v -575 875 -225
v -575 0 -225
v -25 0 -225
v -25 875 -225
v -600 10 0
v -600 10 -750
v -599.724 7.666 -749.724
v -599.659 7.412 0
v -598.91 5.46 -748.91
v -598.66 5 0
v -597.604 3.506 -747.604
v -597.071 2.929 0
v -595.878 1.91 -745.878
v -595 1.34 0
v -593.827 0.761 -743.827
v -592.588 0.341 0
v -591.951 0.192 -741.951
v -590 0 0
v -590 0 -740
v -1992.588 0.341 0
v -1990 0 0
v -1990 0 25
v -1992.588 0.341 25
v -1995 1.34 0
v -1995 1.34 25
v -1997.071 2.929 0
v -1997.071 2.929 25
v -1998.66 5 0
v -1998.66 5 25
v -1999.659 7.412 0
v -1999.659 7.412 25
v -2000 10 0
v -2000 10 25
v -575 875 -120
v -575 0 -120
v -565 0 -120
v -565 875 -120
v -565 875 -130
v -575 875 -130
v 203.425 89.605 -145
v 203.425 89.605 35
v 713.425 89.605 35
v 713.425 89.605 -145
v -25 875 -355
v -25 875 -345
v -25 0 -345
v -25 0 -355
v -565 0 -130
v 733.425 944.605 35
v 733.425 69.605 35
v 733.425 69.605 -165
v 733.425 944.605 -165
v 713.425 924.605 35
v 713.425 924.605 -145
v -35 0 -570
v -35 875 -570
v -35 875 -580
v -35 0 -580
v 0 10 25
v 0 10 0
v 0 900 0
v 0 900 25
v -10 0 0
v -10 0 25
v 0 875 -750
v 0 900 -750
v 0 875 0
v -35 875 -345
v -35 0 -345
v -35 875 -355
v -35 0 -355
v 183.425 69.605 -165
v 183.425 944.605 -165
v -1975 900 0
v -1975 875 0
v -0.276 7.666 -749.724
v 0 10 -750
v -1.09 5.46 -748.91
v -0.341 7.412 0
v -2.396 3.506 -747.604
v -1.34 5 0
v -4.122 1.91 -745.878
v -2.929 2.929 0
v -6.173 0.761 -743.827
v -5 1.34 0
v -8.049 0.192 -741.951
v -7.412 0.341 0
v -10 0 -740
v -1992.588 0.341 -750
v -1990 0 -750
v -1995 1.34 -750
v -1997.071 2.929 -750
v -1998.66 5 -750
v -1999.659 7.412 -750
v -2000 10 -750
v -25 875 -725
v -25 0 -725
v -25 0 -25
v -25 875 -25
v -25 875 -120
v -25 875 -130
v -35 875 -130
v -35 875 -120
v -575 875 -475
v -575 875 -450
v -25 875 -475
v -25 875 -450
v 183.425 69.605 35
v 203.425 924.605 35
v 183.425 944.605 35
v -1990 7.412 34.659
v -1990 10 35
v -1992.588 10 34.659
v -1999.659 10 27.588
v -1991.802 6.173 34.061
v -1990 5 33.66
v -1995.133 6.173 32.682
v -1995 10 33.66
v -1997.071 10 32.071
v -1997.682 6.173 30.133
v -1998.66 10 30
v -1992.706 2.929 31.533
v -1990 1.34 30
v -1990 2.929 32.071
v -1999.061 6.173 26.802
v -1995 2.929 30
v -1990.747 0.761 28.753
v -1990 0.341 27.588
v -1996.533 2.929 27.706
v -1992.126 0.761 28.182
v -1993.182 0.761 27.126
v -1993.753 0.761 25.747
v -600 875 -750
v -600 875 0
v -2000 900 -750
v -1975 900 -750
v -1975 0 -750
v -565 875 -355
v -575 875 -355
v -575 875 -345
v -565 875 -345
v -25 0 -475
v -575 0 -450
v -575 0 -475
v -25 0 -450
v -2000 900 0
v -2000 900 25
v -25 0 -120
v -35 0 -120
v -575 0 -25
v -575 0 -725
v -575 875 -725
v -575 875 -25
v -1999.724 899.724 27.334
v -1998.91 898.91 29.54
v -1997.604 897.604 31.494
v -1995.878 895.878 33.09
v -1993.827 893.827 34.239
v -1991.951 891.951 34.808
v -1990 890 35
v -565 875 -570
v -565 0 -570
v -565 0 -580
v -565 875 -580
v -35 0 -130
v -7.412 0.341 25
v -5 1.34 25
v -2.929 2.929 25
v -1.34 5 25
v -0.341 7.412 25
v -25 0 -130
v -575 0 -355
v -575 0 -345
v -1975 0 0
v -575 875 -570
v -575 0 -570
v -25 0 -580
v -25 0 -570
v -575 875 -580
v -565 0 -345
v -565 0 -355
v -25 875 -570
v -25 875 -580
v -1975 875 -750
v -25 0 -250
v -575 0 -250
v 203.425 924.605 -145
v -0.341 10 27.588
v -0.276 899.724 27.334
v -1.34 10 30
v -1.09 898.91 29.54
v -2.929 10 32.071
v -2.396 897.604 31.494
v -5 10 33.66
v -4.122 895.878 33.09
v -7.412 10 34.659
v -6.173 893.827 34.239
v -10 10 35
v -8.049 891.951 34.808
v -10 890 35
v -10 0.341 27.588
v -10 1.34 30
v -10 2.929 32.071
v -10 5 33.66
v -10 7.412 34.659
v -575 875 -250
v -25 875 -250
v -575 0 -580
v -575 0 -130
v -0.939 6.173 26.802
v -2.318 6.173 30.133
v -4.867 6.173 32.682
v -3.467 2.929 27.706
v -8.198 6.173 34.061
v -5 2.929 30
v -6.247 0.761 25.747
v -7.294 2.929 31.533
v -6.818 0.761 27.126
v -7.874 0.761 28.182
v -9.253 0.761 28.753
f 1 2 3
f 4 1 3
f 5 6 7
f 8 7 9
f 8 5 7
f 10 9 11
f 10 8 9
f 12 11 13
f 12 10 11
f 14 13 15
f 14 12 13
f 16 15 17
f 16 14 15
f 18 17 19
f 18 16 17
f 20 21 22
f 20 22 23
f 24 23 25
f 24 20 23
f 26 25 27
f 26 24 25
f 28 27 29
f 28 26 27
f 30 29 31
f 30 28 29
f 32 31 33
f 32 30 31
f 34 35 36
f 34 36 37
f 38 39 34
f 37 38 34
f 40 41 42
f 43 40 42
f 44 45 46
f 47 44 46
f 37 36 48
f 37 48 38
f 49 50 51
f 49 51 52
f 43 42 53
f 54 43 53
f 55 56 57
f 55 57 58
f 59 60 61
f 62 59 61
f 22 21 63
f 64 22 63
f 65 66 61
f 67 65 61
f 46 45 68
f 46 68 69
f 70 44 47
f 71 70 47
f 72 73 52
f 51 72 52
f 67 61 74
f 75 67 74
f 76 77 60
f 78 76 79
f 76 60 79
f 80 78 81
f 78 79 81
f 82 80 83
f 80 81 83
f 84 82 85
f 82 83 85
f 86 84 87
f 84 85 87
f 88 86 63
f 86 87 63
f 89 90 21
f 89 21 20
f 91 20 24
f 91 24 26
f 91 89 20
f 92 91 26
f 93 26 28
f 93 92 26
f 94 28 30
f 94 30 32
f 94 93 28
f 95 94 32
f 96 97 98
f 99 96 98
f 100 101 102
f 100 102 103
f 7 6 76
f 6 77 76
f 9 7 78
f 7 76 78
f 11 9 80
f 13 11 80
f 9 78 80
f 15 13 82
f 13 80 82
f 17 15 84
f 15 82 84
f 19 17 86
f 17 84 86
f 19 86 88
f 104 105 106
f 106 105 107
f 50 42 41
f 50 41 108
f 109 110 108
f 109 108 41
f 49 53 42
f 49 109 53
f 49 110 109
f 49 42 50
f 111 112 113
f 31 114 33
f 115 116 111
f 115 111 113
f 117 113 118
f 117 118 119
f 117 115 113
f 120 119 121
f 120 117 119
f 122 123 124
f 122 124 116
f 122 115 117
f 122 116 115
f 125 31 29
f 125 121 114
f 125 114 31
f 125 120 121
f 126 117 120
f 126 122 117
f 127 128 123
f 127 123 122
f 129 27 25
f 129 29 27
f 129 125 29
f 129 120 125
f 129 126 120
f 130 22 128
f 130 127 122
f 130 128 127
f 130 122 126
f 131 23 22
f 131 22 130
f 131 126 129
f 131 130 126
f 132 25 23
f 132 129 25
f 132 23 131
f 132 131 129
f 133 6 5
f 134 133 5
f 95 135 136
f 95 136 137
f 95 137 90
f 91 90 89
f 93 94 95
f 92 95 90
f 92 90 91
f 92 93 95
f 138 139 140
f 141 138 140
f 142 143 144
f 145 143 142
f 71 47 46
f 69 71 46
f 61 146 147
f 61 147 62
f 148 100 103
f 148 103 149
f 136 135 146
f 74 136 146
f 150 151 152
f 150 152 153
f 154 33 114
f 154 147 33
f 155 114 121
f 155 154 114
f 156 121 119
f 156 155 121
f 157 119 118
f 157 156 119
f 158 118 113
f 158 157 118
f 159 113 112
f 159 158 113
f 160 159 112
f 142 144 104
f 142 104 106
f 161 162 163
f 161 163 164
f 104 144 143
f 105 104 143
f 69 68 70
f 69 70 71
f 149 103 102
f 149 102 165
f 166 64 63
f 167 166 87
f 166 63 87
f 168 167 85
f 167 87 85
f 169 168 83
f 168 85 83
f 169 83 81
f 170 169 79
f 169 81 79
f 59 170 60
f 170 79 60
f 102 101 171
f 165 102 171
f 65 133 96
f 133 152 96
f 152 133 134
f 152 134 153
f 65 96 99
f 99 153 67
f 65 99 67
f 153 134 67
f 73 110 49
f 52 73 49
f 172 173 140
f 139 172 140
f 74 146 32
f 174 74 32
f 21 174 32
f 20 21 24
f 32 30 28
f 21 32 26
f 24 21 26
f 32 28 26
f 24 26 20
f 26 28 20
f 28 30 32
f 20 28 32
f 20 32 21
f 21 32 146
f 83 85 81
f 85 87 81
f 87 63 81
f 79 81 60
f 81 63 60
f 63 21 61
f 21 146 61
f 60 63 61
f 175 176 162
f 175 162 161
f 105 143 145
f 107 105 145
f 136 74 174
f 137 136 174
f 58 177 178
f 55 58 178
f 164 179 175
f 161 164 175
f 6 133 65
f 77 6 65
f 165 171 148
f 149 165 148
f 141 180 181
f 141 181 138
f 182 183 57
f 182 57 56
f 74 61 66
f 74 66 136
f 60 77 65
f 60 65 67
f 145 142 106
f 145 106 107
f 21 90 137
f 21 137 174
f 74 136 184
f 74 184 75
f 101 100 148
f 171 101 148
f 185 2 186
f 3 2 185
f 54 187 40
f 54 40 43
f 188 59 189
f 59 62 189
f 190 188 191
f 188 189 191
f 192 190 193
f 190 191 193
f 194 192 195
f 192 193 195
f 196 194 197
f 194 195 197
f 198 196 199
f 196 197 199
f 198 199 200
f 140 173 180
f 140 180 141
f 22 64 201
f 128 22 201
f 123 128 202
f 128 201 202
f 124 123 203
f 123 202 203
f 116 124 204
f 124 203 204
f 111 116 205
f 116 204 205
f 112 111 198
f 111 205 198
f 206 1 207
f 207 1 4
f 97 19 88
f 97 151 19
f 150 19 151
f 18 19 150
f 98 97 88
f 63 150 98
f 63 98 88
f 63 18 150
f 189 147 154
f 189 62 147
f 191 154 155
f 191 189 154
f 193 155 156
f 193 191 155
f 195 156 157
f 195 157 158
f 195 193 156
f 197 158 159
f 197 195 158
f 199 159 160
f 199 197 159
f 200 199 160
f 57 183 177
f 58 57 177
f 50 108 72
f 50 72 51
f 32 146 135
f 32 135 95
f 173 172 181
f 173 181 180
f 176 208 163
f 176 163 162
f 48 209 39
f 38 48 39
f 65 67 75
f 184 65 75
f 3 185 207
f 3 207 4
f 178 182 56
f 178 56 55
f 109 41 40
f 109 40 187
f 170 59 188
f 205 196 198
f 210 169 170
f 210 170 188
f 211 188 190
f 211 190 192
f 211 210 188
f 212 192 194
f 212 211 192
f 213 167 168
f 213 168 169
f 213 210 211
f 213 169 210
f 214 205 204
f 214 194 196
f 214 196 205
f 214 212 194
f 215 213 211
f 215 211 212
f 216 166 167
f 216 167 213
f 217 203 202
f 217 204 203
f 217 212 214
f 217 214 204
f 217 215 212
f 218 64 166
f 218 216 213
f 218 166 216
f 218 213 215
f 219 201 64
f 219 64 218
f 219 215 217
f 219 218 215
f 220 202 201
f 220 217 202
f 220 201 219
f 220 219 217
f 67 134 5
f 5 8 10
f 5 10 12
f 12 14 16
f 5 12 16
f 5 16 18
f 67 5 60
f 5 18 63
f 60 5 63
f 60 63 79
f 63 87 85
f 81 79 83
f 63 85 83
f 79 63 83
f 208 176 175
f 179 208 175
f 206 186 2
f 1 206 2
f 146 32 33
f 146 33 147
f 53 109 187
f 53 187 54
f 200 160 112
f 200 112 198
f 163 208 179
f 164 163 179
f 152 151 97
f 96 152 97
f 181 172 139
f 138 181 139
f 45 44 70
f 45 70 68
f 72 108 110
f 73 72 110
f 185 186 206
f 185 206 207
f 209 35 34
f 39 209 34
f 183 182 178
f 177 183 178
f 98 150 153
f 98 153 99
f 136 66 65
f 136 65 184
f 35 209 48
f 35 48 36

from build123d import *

# Parameters (mm, degrees)
F0_W           = 2000
F0_H           = 900
F1_DEPTH       = 35
F2_R           = 10
F3_W           = 600
F3_H           = 750
F3_W_2         = 550
F3_H_2         = 700
F4_DEPTH       = 875
F5_R           = 10
F6_W           = 900
F6_H           = 750
F7_DEPTH       = 25
F8_W           = 1975
F8_H           = 750
F9_DEPTH       = 25
F10_T1_DEPTH   = 50
F10_S5_W       = 10
F10_S5_H       = 10
F10_T6_DEPTH   = 10
F10_2_T1_DEPTH = 800
F11_T1_DEPTH   = 50
F11_S5_W       = 10
F11_S5_H       = 10
F11_T6_DEPTH   = 10
F12_W          = 550
F12_H          = 25
F13_DEPTH      = 875
F14_W          = 550
F14_H          = 25
F15_DEPTH      = 875
F16_W          = 875
F16_H          = 10
F17_DEPTH      = 10
F18_W          = 875
F18_H          = 10
F19_DEPTH      = 10
F20_W          = 550
F20_H          = 875
F21_DEPTH      = 200
F22_T          = -20


# Not quite as in the source:
# - a fillet or chamfer that OpenCascade refuses, or shapes differently, is made with other operations: its cross-section is extruded or revolved along the edge and cut away or added


with BuildPart() as f1:
    # F0 (on Top) → F1 (new body)
    with BuildSketch(Plane.XY):
        with Locations((-1000, 450)):
            Rectangle(F0_W, F0_H)
    extrude(amount=F1_DEPTH)

    # F2
    f2_edges = [f1.edges().sort_by_distance(p)[0] for p in [
        (-2000, 450, 35),
        (-1000, 900, 35),
        (0, 450, 35),
        (-1000, 0, 35),
    ]]
    fillet(f2_edges, radius=F2_R)

    # F10: fillet of radius 10 on 1 edges, made by hand

    # F10_s2 → F10_t1 (cut)
    with BuildSketch(Plane.XY.offset(-25)):
        with BuildLine():
            ThreePointArc((-1990, 0), (-1997.0710678119, 2.9289321881), (-2000, 10))
            Line((-2000, 10), (-2000, 0))
            Line((-2000, 0), (-1990, 0))
        make_face()
    extrude(amount=F10_T1_DEPTH, mode=Mode.SUBTRACT)


with BuildPart() as f4:
    # F3 (on Front) → F4 (new body)
    with BuildSketch(Plane.XZ):
        with Locations((-300, -375)):
            Rectangle(F3_W, F3_H)
        with Locations((-300, -375)):
            Rectangle(F3_W_2, F3_H_2, mode=Mode.SUBTRACT)
    extrude(amount=-F4_DEPTH)

    # F5
    f5_edges = [f4.edges().sort_by_distance(p)[0] for p in [
        (-600, 0, -375),
        (-300, 0, -750),
        (0, 0, -375),
    ]]
    fillet(f5_edges, radius=F5_R)


with BuildPart() as f7:
    # F6 (on face) → F7 (new body)
    with BuildSketch(Plane(origin=(-2000, 0, 0), x_dir=(0, -1, 0), z_dir=(-1, 0, 0))):
        with Locations((-450, -375)):
            Rectangle(F6_W, F6_H)
    extrude(amount=-F7_DEPTH)

    # F10#2: fillet of radius 10 on 1 edges, made by hand

    # F10_2_s2 → F10_2_t1 (cut)
    with BuildSketch(Plane.XY.offset(-775)):
        with BuildLine():
            ThreePointArc((-1990, 0), (-1997.0710678119, 2.9289321881), (-2000, 10))
            Line((-2000, 10), (-2000, 0))
            Line((-2000, 0), (-1990, 0))
        make_face()
    extrude(amount=F10_2_T1_DEPTH, mode=Mode.SUBTRACT)


with BuildPart() as f9:
    # F8 (on face) → F9 (new body)
    with BuildSketch(Plane(origin=(0, 900, 0), x_dir=(-1, 0, 0), z_dir=(0, 1, 0))):
        with Locations((987.5, -375)):
            Rectangle(F8_W, F8_H)
    extrude(amount=-F9_DEPTH)


with BuildPart() as f10_tool4:
    # F10_s5 → F10_t6 (new body)
    with BuildSketch(Plane.XZ.offset(-10)):
        with Locations((-1995, 30)):
            Rectangle(F10_S5_W, F10_S5_H)
    extrude(amount=F10_T6_DEPTH)

    # F10_s7 → F10_t8 (revolve, cut)
    with BuildSketch(Plane(origin=(-1990, 10, 25), x_dir=(0.7071067812, 0, -0.7071067812), z_dir=(-0.7071067812, 0, -0.7071067812))):
        with BuildLine():
            ThreePointArc((0, -10), (10, 0), (0, 10))
            Line((0, 10), (0, -10))
        make_face()
    revolve(axis=Axis((-1990, 10, 25), (0, -1, 0)), mode=Mode.SUBTRACT)


with BuildPart() as f1_1:
    add(f1.part)

    # F10_t3: cut F10_tool4
    add(f10_tool4.part, mode=Mode.SUBTRACT)

    # F11: fillet of radius 10 on 1 edges, made by hand

    # F11_s2 → F11_t1 (cut)
    with BuildSketch(Plane.XY.offset(-25)):
        with BuildLine():
            ThreePointArc((-10, 0), (-2.9289321881, 2.9289321881), (0, 10))
            Line((0, 10), (0, 0))
            Line((0, 0), (-10, 0))
        make_face()
    extrude(amount=F11_T1_DEPTH, mode=Mode.SUBTRACT)


with BuildPart() as f11_tool4:
    # F11_s5 → F11_t6 (new body)
    with BuildSketch(Plane.XZ.offset(-10)):
        with Locations((-5, 30)):
            Rectangle(F11_S5_W, F11_S5_H)
    extrude(amount=F11_T6_DEPTH)

    # F11_s7 → F11_t8 (revolve, cut)
    with BuildSketch(Plane(origin=(-10, 10, 25), x_dir=(-0.7071067812, 0, -0.7071067812), z_dir=(-0.7071067812, 0, 0.7071067812))):
        with BuildLine():
            ThreePointArc((0, -10), (10, 0), (0, 10))
            Line((0, 10), (0, -10))
        make_face()
    revolve(axis=Axis((-10, 10, 25), (0, -1, 0)), mode=Mode.SUBTRACT)


with BuildPart() as f1_2:
    add(f1_1.part)

    # F11_t3: cut F11_tool4
    add(f11_tool4.part, mode=Mode.SUBTRACT)


with BuildPart() as f13:
    # F12 (on face) → F13 (new body)
    with BuildSketch(Plane.XZ):
        with Locations((-300, -237.5)):
            Rectangle(F12_W, F12_H)
    extrude(amount=-F13_DEPTH)


with BuildPart() as f15:
    # F14 (on face) → F15 (new body)
    with BuildSketch(Plane.XZ):
        with Locations((-300, -462.5)):
            Rectangle(F14_W, F14_H)
    extrude(amount=-F15_DEPTH)


with BuildPart() as f17:
    # F16 (on face) → F17 (new body)
    with BuildSketch(Plane.YZ.offset(-575)):
        with Locations((437.5, -125)):
            Rectangle(F16_W, F16_H)
    extrude(amount=F17_DEPTH)


with BuildPart() as f17b:
    # F16 (on face) → F17, piece 2 (new body)
    with BuildSketch(Plane.YZ.offset(-575)):
        with Locations((437.5, -350)):
            Rectangle(F16_W, F16_H)
    extrude(amount=F17_DEPTH)


with BuildPart() as f17c:
    # F16 (on face) → F17, piece 3 (new body)
    with BuildSketch(Plane.YZ.offset(-575)):
        with Locations((437.5, -575)):
            Rectangle(F16_W, F16_H)
    extrude(amount=F17_DEPTH)


with BuildPart() as f19:
    # F18 (on face) → F19 (new body)
    with BuildSketch(Plane(origin=(-25, 0, 0), x_dir=(0, -1, 0), z_dir=(-1, 0, 0))):
        with Locations((-437.5, -125)):
            Rectangle(F18_W, F18_H)
    extrude(amount=F19_DEPTH)


with BuildPart() as f19b:
    # F18 (on face) → F19, piece 2 (new body)
    with BuildSketch(Plane(origin=(-25, 0, 0), x_dir=(0, -1, 0), z_dir=(-1, 0, 0))):
        with Locations((-437.5, -350)):
            Rectangle(F18_W, F18_H)
    extrude(amount=F19_DEPTH)


with BuildPart() as f19c:
    # F18 (on face) → F19, piece 3 (new body)
    with BuildSketch(Plane(origin=(-25, 0, 0), x_dir=(0, -1, 0), z_dir=(-1, 0, 0))):
        with Locations((-437.5, -575)):
            Rectangle(F18_W, F18_H)
    extrude(amount=F19_DEPTH)


with BuildPart() as f21:
    # F20 (on face) → F21 (new body)
    with BuildSketch(Plane.XY.offset(35)):
        with Locations((458.4253653884, 507.1054147508)):
            Rectangle(F20_W, F20_H)
    extrude(amount=-F21_DEPTH)

    # F22
    f22_openings = [f21.faces().sort_by_distance(p)[0] for p in [
        (458.425365, 507.105415, 35),
    ]]
    offset(amount=F22_T, openings=f22_openings)


solid = Compound([f4.part, f7.part, f9.part, f1_2.part, f13.part, f15.part, f17.part, f17b.part, f17c.part, f19.part, f19b.part, f19c.part, f21.part])
